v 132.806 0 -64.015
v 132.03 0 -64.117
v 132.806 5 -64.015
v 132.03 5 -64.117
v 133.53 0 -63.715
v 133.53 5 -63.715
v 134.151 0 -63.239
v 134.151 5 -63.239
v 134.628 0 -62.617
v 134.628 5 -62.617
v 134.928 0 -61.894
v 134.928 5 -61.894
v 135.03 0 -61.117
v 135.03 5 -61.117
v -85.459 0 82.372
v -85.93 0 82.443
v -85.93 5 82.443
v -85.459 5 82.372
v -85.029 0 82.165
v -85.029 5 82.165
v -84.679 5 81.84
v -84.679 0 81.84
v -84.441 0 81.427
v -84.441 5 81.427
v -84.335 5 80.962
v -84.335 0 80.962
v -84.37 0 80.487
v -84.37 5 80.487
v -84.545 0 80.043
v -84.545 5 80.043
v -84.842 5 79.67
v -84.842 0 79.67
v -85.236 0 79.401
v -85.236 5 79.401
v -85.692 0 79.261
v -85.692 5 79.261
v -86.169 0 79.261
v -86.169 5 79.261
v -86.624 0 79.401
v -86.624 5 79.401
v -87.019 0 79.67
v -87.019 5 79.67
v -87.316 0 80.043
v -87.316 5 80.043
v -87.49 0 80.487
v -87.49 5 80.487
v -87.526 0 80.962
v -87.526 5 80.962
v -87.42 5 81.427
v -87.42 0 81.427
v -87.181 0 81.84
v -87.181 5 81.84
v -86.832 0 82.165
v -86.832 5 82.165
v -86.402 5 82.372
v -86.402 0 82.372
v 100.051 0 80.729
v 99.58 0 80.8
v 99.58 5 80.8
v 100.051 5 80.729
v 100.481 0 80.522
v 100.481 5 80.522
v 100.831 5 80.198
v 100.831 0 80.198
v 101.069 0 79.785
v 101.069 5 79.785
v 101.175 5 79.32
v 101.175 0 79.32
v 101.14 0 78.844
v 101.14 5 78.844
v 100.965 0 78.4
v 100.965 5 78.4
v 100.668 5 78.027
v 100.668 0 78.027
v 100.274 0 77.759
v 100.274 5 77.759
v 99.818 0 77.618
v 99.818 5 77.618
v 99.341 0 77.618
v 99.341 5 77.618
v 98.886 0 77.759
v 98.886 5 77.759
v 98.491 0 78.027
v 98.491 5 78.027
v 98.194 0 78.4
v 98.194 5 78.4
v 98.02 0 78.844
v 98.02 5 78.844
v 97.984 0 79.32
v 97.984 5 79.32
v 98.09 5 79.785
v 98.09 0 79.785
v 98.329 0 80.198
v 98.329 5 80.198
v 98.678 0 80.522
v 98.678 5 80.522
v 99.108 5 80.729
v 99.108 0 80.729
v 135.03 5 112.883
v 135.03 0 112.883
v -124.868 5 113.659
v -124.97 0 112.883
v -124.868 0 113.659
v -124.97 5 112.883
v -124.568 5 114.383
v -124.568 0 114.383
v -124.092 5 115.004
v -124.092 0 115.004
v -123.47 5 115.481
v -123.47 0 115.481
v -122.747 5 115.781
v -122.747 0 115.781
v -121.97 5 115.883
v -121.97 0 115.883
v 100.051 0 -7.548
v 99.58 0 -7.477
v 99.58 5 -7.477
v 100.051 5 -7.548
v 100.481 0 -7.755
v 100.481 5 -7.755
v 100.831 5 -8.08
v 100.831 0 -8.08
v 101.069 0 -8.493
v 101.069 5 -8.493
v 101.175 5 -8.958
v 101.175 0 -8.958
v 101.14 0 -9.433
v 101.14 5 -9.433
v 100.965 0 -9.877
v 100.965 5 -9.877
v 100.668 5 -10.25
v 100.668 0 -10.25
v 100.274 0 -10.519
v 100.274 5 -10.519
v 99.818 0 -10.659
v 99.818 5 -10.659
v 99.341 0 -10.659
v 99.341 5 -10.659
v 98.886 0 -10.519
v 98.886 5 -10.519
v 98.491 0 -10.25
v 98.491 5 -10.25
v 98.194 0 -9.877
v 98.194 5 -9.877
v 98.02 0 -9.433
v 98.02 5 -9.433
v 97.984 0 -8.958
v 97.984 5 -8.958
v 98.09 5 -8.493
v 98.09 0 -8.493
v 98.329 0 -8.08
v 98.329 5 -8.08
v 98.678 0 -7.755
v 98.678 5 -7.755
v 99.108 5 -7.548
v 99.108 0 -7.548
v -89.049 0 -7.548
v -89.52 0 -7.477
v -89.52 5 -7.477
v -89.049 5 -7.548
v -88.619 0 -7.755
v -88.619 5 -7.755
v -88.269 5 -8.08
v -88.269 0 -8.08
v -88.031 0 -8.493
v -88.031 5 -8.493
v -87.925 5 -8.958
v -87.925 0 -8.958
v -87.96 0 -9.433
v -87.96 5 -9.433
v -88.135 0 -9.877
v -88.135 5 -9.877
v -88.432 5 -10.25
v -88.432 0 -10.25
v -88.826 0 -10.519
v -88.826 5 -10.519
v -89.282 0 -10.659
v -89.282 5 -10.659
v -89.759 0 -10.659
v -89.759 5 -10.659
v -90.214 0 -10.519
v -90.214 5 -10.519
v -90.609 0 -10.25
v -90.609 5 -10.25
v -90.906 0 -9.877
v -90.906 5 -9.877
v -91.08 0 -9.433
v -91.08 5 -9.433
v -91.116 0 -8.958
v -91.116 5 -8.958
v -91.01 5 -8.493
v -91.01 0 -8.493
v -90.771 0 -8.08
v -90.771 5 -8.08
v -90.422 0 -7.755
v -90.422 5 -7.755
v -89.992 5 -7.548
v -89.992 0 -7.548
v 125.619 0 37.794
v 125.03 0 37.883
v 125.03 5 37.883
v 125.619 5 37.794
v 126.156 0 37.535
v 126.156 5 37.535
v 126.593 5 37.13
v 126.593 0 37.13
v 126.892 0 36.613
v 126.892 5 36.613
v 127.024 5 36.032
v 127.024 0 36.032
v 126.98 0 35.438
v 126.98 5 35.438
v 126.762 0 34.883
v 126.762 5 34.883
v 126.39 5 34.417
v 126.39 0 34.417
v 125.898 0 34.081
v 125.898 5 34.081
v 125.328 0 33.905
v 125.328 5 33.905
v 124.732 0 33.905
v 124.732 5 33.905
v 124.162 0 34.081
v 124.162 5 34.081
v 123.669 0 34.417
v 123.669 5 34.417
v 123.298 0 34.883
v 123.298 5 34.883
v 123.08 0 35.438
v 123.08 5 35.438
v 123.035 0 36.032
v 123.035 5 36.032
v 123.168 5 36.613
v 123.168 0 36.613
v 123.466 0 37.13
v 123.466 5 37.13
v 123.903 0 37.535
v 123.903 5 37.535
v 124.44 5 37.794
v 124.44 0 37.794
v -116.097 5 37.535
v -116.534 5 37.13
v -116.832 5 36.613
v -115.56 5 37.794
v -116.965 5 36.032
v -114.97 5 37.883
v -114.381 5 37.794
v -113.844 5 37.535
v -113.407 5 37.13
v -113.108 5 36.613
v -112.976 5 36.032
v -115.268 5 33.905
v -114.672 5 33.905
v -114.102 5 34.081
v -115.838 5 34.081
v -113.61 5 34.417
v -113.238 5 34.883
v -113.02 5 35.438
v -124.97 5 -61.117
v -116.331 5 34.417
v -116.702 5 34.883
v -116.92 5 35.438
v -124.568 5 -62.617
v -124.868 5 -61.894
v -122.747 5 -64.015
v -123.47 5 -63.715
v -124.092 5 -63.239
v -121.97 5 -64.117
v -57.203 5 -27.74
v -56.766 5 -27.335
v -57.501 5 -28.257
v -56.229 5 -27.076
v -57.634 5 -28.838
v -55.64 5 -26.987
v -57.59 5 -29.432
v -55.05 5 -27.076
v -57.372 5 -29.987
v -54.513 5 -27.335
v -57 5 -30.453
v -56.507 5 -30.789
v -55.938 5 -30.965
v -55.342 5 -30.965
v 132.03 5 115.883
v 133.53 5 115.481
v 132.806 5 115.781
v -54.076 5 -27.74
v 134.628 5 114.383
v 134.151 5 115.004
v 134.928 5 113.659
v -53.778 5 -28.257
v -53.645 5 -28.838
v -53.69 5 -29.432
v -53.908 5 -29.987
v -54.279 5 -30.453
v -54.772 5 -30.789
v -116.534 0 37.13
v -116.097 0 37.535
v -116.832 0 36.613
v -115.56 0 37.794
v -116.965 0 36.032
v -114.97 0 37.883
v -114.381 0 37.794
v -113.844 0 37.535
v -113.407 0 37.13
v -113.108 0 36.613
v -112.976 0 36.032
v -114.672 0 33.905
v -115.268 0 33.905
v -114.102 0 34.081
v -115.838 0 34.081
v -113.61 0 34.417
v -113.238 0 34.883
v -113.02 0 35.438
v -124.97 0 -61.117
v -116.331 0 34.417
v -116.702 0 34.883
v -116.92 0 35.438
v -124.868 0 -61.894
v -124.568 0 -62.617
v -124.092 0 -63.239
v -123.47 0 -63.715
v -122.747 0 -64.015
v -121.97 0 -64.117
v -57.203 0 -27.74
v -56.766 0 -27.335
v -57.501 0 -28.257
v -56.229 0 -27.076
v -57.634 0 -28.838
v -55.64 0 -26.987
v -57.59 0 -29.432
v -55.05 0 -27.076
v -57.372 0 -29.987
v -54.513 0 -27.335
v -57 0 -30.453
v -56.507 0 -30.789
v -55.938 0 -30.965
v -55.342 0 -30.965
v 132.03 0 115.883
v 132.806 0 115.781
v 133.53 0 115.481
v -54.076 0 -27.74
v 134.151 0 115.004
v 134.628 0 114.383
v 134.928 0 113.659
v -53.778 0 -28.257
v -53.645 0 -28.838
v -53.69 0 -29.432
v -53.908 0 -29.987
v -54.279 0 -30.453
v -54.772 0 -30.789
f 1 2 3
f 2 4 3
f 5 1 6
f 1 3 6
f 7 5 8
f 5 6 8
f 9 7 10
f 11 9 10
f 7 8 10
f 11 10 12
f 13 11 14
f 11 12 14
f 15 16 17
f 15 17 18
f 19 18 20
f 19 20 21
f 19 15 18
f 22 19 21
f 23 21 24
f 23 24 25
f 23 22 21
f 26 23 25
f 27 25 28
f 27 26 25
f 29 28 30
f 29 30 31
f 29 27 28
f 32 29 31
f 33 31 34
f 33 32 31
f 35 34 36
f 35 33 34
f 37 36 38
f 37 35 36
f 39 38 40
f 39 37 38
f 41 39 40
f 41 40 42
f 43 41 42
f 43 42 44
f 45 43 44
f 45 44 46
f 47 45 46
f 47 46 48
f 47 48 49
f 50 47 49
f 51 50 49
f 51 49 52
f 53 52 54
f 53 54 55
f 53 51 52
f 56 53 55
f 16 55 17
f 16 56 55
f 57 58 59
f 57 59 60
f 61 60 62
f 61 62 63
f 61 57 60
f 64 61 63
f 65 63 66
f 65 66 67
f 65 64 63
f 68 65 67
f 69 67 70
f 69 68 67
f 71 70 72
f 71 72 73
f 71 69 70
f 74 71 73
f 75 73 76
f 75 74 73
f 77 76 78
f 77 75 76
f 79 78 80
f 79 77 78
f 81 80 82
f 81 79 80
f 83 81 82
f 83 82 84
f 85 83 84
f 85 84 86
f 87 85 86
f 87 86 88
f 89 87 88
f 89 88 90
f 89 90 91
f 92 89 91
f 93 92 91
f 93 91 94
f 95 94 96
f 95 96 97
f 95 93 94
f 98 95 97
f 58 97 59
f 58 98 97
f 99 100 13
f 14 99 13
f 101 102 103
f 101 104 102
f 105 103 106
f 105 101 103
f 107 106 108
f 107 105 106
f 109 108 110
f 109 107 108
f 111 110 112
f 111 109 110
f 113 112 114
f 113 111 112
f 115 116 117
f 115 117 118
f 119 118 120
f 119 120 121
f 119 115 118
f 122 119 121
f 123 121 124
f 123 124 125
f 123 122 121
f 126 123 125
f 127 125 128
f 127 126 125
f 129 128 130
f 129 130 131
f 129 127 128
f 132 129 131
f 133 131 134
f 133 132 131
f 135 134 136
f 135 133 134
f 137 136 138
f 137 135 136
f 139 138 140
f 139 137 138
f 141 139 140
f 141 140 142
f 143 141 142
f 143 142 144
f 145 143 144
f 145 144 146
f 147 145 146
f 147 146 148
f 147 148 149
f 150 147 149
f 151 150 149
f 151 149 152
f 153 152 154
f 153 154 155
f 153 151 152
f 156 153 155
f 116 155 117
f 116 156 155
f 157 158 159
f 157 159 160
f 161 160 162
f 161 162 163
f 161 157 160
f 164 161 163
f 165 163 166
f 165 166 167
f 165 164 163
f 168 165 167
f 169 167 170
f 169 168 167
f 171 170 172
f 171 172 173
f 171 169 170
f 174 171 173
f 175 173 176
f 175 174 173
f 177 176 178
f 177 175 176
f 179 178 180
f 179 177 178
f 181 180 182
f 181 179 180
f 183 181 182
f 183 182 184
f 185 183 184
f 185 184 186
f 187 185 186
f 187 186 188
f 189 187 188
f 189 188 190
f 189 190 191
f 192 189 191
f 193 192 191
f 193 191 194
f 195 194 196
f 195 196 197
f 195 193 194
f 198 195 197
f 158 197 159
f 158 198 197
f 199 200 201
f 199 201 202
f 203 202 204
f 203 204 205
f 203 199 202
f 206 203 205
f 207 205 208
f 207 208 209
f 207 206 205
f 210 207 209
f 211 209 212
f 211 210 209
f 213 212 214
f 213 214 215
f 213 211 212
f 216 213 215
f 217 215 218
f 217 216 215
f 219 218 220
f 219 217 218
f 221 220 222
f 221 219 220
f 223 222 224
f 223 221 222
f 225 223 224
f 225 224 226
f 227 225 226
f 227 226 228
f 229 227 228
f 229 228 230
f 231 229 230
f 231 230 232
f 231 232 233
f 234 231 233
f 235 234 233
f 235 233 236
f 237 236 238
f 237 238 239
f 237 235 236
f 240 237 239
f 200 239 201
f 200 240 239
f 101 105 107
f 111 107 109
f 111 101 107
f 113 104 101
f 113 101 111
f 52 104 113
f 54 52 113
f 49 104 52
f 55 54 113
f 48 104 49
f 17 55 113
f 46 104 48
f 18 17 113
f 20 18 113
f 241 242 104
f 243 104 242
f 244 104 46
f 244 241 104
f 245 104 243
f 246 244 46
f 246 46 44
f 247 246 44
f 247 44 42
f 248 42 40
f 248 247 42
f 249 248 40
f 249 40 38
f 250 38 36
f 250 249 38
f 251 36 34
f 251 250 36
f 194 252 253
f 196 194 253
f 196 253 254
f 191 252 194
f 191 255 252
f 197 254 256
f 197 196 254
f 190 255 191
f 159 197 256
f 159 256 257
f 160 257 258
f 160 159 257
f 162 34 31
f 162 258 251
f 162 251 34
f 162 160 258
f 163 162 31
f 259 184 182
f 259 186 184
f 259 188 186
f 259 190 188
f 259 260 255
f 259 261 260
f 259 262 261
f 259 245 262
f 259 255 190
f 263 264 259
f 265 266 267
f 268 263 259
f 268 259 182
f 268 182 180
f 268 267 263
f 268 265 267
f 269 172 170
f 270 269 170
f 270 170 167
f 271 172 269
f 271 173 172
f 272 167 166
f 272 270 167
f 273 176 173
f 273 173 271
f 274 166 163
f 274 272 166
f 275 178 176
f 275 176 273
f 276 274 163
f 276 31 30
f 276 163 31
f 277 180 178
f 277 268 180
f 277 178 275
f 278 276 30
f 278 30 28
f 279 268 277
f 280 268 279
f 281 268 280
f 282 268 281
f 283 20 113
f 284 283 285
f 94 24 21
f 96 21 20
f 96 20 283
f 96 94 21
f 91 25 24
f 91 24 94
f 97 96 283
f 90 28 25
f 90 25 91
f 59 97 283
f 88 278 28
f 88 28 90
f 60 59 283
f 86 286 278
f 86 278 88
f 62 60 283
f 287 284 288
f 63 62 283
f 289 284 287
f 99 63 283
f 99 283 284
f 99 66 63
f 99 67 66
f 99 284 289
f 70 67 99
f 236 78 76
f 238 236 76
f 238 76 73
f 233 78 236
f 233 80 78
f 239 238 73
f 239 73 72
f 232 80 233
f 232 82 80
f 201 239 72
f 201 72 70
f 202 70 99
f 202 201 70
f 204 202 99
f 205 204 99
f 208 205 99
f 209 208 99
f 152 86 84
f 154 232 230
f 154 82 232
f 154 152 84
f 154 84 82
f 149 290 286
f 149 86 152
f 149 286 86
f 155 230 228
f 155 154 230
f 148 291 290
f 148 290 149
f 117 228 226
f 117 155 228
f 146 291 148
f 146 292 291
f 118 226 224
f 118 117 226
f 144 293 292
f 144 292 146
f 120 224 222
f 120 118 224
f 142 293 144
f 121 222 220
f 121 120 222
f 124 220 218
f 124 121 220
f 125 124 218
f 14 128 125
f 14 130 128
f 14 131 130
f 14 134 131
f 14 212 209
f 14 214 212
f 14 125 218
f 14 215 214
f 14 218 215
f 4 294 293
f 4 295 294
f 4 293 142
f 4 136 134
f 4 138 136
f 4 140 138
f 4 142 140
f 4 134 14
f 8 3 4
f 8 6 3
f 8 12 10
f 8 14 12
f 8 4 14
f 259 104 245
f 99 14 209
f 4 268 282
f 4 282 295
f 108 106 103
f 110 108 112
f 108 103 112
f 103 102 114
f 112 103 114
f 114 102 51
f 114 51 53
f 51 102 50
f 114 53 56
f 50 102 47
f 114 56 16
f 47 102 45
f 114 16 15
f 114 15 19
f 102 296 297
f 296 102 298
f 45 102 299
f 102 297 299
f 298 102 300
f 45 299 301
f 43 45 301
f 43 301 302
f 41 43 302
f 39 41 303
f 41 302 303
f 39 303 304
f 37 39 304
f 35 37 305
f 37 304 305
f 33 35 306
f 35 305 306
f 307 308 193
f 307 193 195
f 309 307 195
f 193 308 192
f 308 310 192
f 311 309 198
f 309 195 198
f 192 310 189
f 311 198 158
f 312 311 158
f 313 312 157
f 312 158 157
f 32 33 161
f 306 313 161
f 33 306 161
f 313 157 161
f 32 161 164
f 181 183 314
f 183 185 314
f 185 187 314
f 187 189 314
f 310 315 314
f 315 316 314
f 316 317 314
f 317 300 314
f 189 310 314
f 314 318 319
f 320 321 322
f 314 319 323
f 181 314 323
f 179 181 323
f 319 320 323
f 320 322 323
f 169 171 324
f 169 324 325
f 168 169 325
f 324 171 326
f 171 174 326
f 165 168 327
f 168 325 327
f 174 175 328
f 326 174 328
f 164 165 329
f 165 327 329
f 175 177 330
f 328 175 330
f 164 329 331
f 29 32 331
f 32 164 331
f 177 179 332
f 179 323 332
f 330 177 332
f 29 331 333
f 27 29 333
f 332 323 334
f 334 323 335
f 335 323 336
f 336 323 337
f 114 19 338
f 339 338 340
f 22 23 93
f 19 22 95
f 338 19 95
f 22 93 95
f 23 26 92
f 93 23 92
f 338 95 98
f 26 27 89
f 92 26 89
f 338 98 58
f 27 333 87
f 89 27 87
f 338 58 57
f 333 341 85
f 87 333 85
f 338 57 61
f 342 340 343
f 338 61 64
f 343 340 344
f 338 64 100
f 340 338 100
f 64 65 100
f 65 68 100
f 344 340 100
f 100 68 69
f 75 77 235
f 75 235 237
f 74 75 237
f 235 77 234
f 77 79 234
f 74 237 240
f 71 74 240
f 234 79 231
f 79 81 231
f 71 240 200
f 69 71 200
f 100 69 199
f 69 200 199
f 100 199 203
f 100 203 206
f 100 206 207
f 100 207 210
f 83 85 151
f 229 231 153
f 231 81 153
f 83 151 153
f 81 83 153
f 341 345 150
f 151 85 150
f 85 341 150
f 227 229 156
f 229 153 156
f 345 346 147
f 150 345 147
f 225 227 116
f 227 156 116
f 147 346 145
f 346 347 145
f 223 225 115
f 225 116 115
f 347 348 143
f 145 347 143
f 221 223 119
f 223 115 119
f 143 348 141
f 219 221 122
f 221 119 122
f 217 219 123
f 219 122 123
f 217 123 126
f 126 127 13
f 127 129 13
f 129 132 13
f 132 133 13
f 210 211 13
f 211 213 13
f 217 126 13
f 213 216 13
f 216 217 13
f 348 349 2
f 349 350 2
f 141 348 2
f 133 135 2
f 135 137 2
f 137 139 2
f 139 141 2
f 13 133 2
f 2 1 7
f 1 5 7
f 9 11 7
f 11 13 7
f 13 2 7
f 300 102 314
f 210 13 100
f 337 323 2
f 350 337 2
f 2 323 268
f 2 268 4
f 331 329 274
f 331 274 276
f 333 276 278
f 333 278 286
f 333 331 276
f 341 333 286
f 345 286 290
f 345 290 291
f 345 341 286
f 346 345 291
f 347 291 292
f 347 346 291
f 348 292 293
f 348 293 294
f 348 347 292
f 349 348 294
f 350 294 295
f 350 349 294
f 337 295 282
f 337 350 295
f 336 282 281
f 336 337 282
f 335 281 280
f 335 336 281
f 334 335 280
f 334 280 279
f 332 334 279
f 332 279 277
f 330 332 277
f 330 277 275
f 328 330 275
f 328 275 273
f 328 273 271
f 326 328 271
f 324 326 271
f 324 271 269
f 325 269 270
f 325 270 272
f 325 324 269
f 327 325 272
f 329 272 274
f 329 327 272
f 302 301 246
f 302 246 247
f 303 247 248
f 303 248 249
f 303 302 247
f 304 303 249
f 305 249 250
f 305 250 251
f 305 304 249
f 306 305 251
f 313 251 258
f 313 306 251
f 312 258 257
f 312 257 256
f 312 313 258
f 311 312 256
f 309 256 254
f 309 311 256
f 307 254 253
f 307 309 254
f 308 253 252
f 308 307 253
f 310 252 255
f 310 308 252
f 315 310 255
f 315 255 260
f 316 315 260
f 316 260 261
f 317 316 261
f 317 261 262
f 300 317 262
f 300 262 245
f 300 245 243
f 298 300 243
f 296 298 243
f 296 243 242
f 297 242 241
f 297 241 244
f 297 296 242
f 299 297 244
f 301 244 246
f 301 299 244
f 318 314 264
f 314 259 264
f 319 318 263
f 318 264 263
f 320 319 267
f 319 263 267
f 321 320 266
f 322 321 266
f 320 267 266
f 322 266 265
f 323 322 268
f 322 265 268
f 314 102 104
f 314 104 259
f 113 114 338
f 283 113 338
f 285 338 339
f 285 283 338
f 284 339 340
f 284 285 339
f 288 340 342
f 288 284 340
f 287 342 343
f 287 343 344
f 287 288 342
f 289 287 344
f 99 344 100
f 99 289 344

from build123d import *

# Parameters (mm, degrees)
SKETCH_1_W      = 260
SKETCH_1_H      = 180
SKETCH_1_R      = 1.6
SKETCH_1_R_2    = 2
EXTRUDE_1_DEPTH = 5
FILLET_1_R      = 3


with BuildPart() as part:
    # 草图1 → 凸台-拉伸1 (new body)
    with BuildSketch(Plane(origin=(0, 0, 0), x_dir=(1, 0, 0), z_dir=(0, 1, 0))):
        with Locations((5.029761905, -25.88277742)):
            Rectangle(SKETCH_1_W, SKETCH_1_H)
        with Locations(Location((-89.520238095, 9.07722258, 0), (0, 0, 270))):
            Circle(SKETCH_1_R, mode=Mode.SUBTRACT)
        with Locations(Location((99.579761905, 9.07722258, 0), (0, 0, 270))):
            Circle(SKETCH_1_R, mode=Mode.SUBTRACT)
        with Locations(Location((-85.930238095, -80.84277742, 0), (0, 0, 270))):
            Circle(SKETCH_1_R, mode=Mode.SUBTRACT)
        with Locations(Location((99.579761905, -79.200091518, 0), (0, 0, 270))):
            Circle(SKETCH_1_R, mode=Mode.SUBTRACT)
        with Locations(Location((-55.639680392, 28.987391576, 0), (0, 0, 270))):
            Circle(SKETCH_1_R_2, mode=Mode.SUBTRACT)
        with Locations(Location((-114.970238095, -35.88277742, 0), (0, 0, 270))):
            Circle(SKETCH_1_R_2, mode=Mode.SUBTRACT)
        with Locations(Location((125.029761905, -35.88277742, 0), (0, 0, 270))):
            Circle(SKETCH_1_R_2, mode=Mode.SUBTRACT)
    extrude(amount=EXTRUDE_1_DEPTH)

    # 圆角1
    fillet_1_edges = [part.edges().sort_by_distance(p)[0] for p in [
        (-124.970238095, 2.5, -64.11722258),
        (135.029761905, 2.5, -64.11722258),
        (135.029761905, 2.5, 115.88277742),
        (-124.970238095, 2.5, 115.88277742),
    ]]
    fillet(fillet_1_edges, radius=FILLET_1_R)


solid = part.part
